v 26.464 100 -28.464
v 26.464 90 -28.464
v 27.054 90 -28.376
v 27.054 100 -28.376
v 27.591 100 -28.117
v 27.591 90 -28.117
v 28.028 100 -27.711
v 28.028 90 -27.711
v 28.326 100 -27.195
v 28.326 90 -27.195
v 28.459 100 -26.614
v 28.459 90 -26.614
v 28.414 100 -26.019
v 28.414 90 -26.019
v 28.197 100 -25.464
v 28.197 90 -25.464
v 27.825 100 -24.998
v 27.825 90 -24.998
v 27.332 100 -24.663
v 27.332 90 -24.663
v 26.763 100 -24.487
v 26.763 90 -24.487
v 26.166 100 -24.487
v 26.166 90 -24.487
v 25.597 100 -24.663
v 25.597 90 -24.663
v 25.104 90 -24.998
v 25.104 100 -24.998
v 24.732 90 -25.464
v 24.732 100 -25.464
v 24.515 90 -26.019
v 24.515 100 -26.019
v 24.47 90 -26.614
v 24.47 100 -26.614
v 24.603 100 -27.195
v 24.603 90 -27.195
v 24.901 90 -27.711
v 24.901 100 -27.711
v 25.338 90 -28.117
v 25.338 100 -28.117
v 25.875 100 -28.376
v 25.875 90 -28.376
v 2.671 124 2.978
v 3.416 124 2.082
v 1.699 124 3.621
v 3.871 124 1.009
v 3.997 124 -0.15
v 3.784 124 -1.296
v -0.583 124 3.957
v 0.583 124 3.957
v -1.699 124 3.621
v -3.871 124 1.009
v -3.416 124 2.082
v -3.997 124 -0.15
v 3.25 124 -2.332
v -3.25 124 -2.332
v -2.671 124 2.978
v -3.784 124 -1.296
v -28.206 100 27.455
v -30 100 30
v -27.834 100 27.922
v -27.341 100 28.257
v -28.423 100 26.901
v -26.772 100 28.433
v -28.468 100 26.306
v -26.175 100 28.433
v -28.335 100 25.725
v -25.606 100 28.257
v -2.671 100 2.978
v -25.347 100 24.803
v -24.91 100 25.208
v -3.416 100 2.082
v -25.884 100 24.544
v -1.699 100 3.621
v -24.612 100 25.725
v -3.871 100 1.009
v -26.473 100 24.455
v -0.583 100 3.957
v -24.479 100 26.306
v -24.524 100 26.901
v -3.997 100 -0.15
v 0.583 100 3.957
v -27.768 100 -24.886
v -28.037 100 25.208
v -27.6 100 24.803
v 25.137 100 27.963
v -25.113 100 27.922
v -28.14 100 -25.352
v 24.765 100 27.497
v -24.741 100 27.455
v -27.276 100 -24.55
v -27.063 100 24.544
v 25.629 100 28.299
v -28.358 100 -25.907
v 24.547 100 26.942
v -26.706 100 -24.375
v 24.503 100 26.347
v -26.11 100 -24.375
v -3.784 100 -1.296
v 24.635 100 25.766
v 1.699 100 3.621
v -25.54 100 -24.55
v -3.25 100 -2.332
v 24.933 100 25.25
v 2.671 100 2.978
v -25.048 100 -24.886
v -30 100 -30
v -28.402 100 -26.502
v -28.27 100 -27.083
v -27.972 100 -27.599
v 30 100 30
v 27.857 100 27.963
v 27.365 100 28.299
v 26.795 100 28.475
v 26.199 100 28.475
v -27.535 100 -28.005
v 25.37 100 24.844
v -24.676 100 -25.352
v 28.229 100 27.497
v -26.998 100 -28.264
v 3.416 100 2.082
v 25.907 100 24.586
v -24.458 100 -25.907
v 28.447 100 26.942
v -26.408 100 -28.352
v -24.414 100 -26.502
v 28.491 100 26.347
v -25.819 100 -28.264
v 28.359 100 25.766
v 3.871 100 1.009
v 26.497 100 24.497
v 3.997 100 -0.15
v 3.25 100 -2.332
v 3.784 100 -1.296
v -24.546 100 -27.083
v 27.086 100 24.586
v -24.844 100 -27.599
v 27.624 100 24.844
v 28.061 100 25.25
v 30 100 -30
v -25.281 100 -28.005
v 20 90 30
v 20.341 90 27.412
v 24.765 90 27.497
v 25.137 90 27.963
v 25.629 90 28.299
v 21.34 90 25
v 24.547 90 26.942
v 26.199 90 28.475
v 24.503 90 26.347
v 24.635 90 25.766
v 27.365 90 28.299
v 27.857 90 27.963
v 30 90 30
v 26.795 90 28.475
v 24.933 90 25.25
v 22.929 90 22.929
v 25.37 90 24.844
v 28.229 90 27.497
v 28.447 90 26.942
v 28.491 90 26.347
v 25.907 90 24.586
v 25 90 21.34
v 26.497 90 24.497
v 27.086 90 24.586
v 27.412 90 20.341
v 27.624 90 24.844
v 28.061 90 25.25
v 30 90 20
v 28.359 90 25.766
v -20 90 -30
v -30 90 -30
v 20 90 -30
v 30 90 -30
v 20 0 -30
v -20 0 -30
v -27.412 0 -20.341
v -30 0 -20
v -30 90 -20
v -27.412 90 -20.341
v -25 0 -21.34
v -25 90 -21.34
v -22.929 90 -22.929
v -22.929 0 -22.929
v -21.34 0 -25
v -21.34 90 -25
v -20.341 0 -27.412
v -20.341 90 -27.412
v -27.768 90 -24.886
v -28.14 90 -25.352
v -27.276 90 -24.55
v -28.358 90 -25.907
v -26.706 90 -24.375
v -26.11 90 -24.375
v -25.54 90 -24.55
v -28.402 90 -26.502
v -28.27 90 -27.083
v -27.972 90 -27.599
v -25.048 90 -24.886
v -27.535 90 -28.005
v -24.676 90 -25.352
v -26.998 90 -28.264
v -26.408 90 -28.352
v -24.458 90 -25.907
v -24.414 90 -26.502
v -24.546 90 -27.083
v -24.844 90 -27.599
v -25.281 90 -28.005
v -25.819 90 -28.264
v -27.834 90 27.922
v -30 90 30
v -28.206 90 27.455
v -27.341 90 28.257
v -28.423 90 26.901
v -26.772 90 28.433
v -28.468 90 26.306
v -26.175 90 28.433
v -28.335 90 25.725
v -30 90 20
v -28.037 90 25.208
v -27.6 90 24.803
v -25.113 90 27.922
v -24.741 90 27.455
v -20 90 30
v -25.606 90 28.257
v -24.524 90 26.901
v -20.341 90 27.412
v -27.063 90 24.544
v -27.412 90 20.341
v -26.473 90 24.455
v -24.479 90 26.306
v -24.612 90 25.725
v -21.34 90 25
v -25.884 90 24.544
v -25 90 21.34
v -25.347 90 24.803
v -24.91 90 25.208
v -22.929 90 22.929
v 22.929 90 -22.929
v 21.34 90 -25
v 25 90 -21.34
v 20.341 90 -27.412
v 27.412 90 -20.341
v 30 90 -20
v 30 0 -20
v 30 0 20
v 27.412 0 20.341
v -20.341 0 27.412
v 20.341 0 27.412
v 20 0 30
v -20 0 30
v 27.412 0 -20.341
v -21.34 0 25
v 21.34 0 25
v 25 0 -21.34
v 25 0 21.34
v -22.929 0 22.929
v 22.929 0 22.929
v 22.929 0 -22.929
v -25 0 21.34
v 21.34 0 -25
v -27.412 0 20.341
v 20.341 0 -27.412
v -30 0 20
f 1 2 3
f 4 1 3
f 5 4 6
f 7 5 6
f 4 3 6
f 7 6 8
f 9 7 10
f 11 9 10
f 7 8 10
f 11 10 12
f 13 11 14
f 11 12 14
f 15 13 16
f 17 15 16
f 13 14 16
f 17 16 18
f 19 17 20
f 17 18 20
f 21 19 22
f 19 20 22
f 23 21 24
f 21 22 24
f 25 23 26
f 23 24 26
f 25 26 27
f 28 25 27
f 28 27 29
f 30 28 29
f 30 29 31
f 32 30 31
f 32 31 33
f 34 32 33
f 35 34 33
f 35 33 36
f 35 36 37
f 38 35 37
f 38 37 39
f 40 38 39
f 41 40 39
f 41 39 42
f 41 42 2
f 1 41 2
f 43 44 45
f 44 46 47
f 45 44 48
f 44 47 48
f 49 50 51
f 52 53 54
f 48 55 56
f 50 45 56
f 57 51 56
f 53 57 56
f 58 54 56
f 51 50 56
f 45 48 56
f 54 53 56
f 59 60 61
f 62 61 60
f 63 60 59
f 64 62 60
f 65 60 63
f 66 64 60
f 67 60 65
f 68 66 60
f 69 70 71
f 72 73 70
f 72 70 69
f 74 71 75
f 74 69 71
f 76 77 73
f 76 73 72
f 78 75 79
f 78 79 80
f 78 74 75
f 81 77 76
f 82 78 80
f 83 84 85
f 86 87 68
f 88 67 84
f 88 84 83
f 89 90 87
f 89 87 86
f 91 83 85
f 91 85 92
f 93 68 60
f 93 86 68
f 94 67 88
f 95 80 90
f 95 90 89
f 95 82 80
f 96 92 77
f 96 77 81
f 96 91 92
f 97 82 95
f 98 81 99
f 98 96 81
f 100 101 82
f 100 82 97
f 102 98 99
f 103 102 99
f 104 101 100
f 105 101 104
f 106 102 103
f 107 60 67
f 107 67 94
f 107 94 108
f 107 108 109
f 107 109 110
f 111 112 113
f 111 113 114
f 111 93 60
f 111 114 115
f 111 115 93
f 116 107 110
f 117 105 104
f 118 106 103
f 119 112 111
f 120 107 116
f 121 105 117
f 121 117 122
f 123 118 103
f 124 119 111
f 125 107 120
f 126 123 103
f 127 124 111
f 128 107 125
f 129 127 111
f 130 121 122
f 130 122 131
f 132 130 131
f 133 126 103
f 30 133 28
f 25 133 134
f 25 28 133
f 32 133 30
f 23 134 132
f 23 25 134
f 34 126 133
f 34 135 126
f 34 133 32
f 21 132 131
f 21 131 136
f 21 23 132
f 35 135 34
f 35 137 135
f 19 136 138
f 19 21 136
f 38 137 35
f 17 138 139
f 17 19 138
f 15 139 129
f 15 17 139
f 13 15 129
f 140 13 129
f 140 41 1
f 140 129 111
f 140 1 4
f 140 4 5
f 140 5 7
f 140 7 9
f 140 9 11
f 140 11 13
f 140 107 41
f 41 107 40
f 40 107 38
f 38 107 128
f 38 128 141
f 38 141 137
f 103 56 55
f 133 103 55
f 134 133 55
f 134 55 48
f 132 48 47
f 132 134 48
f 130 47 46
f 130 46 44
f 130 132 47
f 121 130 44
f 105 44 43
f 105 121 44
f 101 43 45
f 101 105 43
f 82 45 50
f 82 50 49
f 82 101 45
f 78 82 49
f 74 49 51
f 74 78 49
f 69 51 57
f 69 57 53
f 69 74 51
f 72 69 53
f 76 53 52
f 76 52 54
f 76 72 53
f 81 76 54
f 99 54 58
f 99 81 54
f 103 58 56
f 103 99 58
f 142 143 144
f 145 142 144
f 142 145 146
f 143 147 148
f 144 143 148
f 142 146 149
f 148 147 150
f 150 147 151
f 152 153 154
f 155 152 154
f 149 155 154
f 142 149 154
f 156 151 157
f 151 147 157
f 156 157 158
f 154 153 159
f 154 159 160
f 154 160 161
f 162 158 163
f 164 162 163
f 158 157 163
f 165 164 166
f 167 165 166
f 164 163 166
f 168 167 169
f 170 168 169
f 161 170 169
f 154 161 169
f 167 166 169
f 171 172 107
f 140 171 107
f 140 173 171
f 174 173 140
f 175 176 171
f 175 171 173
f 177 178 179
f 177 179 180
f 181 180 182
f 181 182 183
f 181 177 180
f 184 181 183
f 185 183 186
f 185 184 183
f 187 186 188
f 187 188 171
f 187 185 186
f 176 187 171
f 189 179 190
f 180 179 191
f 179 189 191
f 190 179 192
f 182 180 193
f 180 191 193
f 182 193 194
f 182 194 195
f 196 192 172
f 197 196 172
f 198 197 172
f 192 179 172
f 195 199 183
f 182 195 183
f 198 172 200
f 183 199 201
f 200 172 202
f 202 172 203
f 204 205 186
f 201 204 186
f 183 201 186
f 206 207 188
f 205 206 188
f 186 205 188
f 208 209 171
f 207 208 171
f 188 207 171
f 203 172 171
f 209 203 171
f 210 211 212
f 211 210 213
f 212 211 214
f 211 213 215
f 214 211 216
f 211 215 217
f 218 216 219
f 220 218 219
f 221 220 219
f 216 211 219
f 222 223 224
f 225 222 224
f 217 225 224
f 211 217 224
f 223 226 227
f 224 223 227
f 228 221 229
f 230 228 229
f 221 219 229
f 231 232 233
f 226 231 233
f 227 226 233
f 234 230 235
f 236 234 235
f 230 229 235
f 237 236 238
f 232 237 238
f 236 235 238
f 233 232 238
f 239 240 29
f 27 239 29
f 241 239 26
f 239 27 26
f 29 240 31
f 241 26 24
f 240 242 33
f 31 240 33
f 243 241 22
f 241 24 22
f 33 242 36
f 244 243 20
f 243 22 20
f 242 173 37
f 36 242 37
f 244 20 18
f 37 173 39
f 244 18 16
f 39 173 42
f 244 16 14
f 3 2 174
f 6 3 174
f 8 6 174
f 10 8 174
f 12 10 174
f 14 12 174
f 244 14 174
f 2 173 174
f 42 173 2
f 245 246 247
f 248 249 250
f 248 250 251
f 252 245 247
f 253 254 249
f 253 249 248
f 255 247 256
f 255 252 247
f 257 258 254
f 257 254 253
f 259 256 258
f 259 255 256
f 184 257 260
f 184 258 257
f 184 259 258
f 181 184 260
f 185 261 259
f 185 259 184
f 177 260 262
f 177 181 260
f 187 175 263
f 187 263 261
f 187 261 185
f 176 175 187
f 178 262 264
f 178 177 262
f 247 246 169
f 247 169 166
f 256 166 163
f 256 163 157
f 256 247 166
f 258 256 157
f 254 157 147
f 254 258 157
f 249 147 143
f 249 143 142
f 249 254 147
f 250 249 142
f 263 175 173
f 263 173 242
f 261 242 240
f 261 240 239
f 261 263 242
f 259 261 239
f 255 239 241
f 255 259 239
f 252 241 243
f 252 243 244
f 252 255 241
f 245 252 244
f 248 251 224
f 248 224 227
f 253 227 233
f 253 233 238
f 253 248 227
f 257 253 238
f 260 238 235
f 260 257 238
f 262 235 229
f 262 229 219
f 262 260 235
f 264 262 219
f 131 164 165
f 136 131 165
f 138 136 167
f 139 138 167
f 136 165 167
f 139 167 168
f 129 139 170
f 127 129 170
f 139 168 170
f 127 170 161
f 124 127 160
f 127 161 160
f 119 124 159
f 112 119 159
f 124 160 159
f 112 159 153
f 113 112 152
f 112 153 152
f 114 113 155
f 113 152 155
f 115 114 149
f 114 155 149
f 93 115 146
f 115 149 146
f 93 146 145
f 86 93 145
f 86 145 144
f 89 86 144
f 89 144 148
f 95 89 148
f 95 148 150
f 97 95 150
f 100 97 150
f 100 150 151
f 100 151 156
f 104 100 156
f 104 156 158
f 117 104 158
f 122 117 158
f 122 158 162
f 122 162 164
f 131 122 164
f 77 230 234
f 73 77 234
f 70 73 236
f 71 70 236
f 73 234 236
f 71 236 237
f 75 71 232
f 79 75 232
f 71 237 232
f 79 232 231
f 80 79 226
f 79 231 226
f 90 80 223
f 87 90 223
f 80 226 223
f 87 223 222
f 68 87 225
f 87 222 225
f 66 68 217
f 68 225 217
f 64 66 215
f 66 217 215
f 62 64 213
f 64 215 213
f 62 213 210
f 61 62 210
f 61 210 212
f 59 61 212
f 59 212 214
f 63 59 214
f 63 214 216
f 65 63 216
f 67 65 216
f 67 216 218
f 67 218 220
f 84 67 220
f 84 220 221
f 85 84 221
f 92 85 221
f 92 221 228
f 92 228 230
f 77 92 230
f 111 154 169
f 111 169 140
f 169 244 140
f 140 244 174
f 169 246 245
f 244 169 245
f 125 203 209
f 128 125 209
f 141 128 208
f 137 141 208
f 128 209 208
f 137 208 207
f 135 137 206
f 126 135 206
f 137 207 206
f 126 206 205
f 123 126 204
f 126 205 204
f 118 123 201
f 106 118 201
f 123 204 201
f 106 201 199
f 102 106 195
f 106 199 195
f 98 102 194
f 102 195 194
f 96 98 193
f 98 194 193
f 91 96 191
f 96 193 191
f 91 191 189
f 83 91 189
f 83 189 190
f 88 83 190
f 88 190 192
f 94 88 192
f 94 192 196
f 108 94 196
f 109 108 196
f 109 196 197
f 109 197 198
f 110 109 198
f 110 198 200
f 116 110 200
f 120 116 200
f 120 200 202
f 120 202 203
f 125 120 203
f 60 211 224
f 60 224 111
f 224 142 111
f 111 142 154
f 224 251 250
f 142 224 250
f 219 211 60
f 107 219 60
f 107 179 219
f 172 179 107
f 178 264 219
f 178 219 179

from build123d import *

# Parameters (mm, degrees)
BOSS_EXTRUDE3_DEPTH = 90
SKETCH3_W           = 60
SKETCH3_H           = 60
BOSS_EXTRUDE4_DEPTH = 10
BOSS_EXTRUDE5_DEPTH = 24
CUT_EXTRUDE1_REACH  = 101.499
SKETCH6_R           = 2
CUT_EXTRUDE2_REACH  = 101.499
SKETCH7_R           = 2
CUT_EXTRUDE3_REACH  = 101.499
SKETCH9_R           = 2
CUT_EXTRUDE4_REACH  = 101.499
SKETCH10_R          = 2


with BuildPart() as part:
    # Sketch1 → Boss-Extrude3 (new body)
    with BuildSketch(Plane(origin=(0, 0, 0), x_dir=(1, 0, 0), z_dir=(0, 1, 0))):
        with BuildLine():
            Line((-20, 30), (20, 30))
            ThreePointArc((20, 30), (22.928932188, 22.928932188), (30, 20))
            Line((30, 20), (30, -20))
            ThreePointArc((30, -20), (22.928932188, -22.928932188), (20, -30))
            Line((20, -30), (-20, -30))
            ThreePointArc((-20, -30), (-22.928932188, -22.928932188), (-30, -20))
            Line((-30, -20), (-30, 20))
            ThreePointArc((-30, 20), (-22.928932188, 22.928932188), (-20, 30))
        make_face()
    extrude(amount=BOSS_EXTRUDE3_DEPTH)

    # Sketch3 → Boss-Extrude4 (add)
    with BuildSketch(Plane(origin=(0, 90, 0), x_dir=(1, 0, 0), z_dir=(0, 1, 0))):
        Rectangle(SKETCH3_W, SKETCH3_H)
    extrude(amount=BOSS_EXTRUDE4_DEPTH)

    # Sketch4 → Boss-Extrude5 (add)
    with BuildSketch(Plane(origin=(0, 100, 0), x_dir=(1, 0, 0), z_dir=(0, 1, 0))):
        with BuildLine():
            Line((-3.25, 2.331844763), (3.25, 2.331844763))
            ThreePointArc((3.25, 2.331844763), (0, -4), (-3.25, 2.331844763))
        make_face()
    extrude(amount=BOSS_EXTRUDE5_DEPTH)

    # Sketch6 → Cut-Extrude1 (cut, up to next)
    with BuildSketch(Plane.XZ.offset(-90), mode=Mode.PRIVATE) as cut_extrude1_sk1:
        with Locations(Location((-26.408079858, -26.352396966, 0), (0, 0, 270))):
            Circle(SKETCH6_R)
    cut_extrude1_tool1 = extrude(cut_extrude1_sk1.sketch, amount=-CUT_EXTRUDE1_REACH, mode=Mode.PRIVATE) & part.part
    add(cut_extrude1_tool1.solids().sort_by_distance((-26.40808, 90, -26.352397))[0], mode=Mode.SUBTRACT)

    # Sketch7 → Cut-Extrude2 (cut, up to next)
    with BuildSketch(Plane.XZ.offset(-90), mode=Mode.PRIVATE) as cut_extrude2_sk1:
        with Locations(Location((-26.47347716, 26.455477937, 0), (0, 0, 270))):
            Circle(SKETCH7_R)
    cut_extrude2_tool1 = extrude(cut_extrude2_sk1.sketch, amount=-CUT_EXTRUDE2_REACH, mode=Mode.PRIVATE) & part.part
    add(cut_extrude2_tool1.solids().sort_by_distance((-26.473477, 90, 26.455478))[0], mode=Mode.SUBTRACT)

    # Sketch9 → Cut-Extrude3 (cut, up to next)
    with BuildSketch(Plane.XZ.offset(-90), mode=Mode.PRIVATE) as cut_extrude3_sk1:
        with Locations(Location((26.496913455, 26.496913455, 0), (0, 0, 270))):
            Circle(SKETCH9_R)
    cut_extrude3_tool1 = extrude(cut_extrude3_sk1.sketch, amount=-CUT_EXTRUDE3_REACH, mode=Mode.PRIVATE) & part.part
    add(cut_extrude3_tool1.solids().sort_by_distance((26.496913, 90, 26.496913))[0], mode=Mode.SUBTRACT)

    # Sketch10 → Cut-Extrude4 (cut, up to next)
    with BuildSketch(Plane.XZ.offset(-90), mode=Mode.PRIVATE) as cut_extrude4_sk1:
        with Locations(Location((26.464466094, -26.464466094, 0), (0, 0, 270))):
            Circle(SKETCH10_R)
    cut_extrude4_tool1 = extrude(cut_extrude4_sk1.sketch, amount=-CUT_EXTRUDE4_REACH, mode=Mode.PRIVATE) & part.part
    add(cut_extrude4_tool1.solids().sort_by_distance((26.464466, 90, -26.464466))[0], mode=Mode.SUBTRACT)


solid = part.part
